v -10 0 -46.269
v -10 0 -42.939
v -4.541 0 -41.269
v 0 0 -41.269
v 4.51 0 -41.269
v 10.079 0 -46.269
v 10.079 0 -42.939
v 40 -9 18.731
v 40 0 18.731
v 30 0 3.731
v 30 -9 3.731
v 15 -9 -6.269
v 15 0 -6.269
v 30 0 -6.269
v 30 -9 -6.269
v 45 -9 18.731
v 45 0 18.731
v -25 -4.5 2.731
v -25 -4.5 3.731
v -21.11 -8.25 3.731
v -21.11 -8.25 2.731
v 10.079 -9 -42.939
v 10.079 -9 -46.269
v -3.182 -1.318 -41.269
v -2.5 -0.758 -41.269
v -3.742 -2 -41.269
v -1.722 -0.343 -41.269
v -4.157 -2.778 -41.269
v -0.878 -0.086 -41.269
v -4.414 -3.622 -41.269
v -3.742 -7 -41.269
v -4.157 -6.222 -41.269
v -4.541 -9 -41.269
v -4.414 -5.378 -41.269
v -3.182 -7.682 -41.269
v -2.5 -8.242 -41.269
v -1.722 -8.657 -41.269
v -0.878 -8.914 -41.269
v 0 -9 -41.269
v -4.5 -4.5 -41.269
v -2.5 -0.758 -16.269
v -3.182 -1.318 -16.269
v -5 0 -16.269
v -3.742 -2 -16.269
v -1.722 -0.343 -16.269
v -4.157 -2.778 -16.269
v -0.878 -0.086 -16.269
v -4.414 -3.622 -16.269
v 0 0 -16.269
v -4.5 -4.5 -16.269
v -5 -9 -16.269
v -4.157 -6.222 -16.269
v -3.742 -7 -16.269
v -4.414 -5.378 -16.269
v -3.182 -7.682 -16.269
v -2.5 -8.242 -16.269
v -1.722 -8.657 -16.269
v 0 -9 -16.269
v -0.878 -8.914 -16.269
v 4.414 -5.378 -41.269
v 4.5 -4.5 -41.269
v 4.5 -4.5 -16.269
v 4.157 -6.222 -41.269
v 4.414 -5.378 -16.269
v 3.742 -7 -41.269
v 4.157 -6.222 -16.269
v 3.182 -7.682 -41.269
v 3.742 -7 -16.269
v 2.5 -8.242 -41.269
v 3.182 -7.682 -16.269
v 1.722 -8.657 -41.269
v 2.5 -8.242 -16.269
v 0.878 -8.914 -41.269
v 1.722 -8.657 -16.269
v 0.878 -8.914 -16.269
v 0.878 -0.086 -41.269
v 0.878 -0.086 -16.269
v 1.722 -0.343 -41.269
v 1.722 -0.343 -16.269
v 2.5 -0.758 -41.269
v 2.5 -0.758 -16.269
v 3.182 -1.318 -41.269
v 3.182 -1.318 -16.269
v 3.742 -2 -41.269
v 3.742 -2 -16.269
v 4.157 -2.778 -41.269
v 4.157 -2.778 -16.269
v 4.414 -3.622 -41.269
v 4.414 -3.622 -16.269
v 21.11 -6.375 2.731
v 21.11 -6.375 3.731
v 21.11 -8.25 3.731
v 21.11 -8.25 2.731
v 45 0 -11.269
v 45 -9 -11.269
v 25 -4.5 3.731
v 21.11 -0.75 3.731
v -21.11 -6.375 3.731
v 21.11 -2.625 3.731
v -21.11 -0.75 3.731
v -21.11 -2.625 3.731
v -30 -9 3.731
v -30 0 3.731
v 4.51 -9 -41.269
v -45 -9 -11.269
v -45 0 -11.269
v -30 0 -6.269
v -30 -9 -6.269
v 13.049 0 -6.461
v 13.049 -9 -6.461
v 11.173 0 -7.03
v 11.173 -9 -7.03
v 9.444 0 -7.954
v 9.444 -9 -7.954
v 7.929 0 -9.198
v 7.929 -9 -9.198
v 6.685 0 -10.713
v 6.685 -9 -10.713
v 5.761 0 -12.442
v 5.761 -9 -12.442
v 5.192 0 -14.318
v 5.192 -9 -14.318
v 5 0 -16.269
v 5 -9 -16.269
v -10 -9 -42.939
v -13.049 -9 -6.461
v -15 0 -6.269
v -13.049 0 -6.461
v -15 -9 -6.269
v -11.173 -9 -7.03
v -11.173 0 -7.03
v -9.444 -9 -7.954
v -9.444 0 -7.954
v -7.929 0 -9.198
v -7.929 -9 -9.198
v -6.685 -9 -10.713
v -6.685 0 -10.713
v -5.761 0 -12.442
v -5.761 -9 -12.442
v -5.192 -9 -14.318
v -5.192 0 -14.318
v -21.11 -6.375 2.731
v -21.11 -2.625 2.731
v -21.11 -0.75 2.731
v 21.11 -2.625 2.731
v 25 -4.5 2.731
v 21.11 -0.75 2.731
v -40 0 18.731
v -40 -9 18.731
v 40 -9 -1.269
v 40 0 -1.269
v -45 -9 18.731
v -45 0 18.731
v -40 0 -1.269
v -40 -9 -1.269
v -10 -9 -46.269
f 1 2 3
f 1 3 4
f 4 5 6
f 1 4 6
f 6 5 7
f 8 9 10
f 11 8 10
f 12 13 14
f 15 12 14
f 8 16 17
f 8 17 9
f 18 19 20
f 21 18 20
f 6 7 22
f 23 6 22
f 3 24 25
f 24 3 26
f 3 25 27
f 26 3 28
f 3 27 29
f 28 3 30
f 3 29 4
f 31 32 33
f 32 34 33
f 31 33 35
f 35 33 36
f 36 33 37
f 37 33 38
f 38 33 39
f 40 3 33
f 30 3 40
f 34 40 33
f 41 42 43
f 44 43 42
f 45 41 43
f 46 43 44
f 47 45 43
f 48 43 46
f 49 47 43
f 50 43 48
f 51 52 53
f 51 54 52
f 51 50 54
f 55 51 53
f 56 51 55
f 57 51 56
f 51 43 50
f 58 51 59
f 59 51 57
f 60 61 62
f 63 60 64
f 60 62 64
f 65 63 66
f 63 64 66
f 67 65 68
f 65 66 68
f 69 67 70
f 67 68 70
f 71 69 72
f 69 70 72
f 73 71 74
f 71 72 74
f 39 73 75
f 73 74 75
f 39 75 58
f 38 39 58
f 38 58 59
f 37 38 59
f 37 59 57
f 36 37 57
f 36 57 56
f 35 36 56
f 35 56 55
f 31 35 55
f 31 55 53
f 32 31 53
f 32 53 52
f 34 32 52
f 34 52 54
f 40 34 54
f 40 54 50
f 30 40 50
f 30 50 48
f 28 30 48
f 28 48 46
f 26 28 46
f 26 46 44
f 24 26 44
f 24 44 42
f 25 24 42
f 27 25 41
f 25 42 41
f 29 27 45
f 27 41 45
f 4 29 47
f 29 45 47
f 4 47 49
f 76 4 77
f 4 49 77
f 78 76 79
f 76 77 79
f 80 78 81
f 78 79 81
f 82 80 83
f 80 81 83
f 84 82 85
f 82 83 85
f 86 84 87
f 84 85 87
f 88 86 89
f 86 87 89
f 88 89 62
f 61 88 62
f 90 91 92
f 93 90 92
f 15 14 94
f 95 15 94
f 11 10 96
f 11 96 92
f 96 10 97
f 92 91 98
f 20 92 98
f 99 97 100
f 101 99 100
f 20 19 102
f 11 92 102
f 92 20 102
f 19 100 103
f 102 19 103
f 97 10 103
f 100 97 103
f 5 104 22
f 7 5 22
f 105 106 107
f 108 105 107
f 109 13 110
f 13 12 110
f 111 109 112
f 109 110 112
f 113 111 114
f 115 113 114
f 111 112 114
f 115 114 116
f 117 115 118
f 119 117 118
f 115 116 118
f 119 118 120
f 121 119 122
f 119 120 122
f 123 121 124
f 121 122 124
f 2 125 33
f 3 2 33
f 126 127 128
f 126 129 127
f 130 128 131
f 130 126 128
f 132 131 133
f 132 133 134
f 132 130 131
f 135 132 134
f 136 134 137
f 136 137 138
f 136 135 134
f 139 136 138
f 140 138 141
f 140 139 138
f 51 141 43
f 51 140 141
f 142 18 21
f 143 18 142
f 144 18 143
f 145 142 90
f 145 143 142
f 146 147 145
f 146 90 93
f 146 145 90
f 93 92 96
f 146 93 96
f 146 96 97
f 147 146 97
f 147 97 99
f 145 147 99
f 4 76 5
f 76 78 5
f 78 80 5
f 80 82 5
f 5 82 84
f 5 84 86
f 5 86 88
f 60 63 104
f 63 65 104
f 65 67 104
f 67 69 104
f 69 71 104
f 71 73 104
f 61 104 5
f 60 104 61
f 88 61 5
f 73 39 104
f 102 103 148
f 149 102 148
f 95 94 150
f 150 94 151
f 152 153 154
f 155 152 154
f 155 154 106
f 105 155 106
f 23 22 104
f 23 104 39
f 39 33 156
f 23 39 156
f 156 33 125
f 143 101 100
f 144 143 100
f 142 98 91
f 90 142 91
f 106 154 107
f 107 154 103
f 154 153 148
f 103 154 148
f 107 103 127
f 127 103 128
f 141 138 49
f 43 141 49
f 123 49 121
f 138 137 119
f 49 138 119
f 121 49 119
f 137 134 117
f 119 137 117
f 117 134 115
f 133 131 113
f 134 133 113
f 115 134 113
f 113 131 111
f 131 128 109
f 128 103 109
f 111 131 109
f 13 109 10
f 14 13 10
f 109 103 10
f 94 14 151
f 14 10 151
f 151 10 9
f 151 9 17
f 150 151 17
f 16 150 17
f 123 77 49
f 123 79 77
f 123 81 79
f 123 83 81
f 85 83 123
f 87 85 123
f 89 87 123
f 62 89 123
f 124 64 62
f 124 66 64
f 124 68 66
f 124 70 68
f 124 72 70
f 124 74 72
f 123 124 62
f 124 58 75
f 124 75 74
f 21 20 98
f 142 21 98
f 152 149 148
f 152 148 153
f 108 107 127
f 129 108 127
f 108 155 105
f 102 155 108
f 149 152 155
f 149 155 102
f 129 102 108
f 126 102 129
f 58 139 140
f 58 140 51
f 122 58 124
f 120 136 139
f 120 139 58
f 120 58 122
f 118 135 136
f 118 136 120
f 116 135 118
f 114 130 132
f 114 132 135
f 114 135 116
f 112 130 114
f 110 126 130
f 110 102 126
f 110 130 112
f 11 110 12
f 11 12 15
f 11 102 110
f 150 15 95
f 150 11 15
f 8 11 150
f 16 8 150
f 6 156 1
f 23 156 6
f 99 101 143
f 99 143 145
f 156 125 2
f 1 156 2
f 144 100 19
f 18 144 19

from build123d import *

# Parameters (mm, degrees)
F1_DEPTH  = 9
F2_W      = 42.22
F2_H      = 1.875
F3_DEPTH  = 1
F4_W      = 10
F4_H      = 9
F5_DEPTH  = 10
F6_R      = 9.99999
F7_R      = 4.5
F8_DEPTH  = 25
F10_DEPTH = 5
F12_DEPTH = 25


# Not quite as in the source:
# - a fillet or chamfer is up to 0.001 mm smaller than in the source, because OpenCascade refuses the exact size


with BuildPart() as f1:
    # F0 (on Front) → F1 (new body)
    with BuildSketch(Plane.XZ):
        Polygon((30, 3.7309644414), (0, 3.7309644414), (-30, 3.7309644414), (-40, 18.7309644414), (-45, 18.7309644414), (-40, -1.2690355586), (-45, -11.2690355586), (-30, -6.2690355586), (0, -6.2690355586), (30, -6.2690355586), (45, -11.2690355586), (40, -1.2690355586), (45, 18.7309644414), (40, 18.7309644414), align=None)
    extrude(amount=F1_DEPTH)

    # F2 (on face) → F3 (cut)
    with BuildSketch(Plane.XY.offset(3.7309644414)):
        Polygon((21.11, -8.25), (25, -4.5), (21.11, -4.5), (21.11, -6.375), align=None)
        Polygon((21.11, -4.5), (25, -4.5), (21.11, -0.75), (21.11, -2.625), align=None)
        with Locations((0, -5.4375)):
            Rectangle(F2_W, F2_H)
        with Locations((0, -3.5625)):
            Rectangle(F2_W, F2_H)
        Polygon((-21.11, -6.375), (-21.11, -4.5), (-25, -4.5), (-21.11, -8.25), align=None)
        Polygon((-25, -4.5), (-21.11, -4.5), (-21.11, -2.625), (-21.11, -0.75), align=None)
    extrude(amount=-F3_DEPTH, mode=Mode.SUBTRACT)

    # F4 (on face) → F5 (join)
    with BuildSketch(Plane(origin=(0, 0, -6.2690355586), x_dir=(1, 0, 0), z_dir=(0, 0, -1))):
        with Locations((0, 4.5)):
            Rectangle(F4_W, F4_H)
    extrude(amount=F5_DEPTH)

    # F6 (radius 10 in the source; OpenCascade refuses exactly that, so slightly less here)
    f6_edges = [f1.edges().sort_by_distance(p)[0] for p in [
        (5, -4.5, -6.269036),
        (-5, -4.5, -6.269036),
    ]]
    fillet(f6_edges, radius=F6_R)

    # F7 (on face) → F8 (join)
    with BuildSketch(Plane(origin=(0, 0, -16.2690355586), x_dir=(1, 0, 0), z_dir=(0, 0, -1))):
        with Locations((0, 4.5)):
            Circle(F7_R)
    extrude(amount=F8_DEPTH)

    # F9 (on face) → F10 (join)
    with BuildSketch(Plane(origin=(0, 0, -41.2690355586), x_dir=(1, 0, 0), z_dir=(0, 0, -1))):
        Polygon((-10, 0), (0, 0), (10.0785335526, 0), (10.0785335526, 9), (0, 9), (-10, 9), align=None)
    extrude(amount=F10_DEPTH)

    # F11 (on face) → F12 (cut)
    with BuildSketch(Plane.XZ.offset(9)):
        Polygon((-10, -41.2690355586), (-10, -42.9390355586), (-4.5407158323, -41.2690355586), align=None)
        Polygon((10.0785335526, -41.2690355586), (4.5102024451, -41.2690355586), (10.0785335526, -42.9390355586), align=None)
    extrude(amount=-F12_DEPTH, mode=Mode.SUBTRACT)


solid = f1.part
